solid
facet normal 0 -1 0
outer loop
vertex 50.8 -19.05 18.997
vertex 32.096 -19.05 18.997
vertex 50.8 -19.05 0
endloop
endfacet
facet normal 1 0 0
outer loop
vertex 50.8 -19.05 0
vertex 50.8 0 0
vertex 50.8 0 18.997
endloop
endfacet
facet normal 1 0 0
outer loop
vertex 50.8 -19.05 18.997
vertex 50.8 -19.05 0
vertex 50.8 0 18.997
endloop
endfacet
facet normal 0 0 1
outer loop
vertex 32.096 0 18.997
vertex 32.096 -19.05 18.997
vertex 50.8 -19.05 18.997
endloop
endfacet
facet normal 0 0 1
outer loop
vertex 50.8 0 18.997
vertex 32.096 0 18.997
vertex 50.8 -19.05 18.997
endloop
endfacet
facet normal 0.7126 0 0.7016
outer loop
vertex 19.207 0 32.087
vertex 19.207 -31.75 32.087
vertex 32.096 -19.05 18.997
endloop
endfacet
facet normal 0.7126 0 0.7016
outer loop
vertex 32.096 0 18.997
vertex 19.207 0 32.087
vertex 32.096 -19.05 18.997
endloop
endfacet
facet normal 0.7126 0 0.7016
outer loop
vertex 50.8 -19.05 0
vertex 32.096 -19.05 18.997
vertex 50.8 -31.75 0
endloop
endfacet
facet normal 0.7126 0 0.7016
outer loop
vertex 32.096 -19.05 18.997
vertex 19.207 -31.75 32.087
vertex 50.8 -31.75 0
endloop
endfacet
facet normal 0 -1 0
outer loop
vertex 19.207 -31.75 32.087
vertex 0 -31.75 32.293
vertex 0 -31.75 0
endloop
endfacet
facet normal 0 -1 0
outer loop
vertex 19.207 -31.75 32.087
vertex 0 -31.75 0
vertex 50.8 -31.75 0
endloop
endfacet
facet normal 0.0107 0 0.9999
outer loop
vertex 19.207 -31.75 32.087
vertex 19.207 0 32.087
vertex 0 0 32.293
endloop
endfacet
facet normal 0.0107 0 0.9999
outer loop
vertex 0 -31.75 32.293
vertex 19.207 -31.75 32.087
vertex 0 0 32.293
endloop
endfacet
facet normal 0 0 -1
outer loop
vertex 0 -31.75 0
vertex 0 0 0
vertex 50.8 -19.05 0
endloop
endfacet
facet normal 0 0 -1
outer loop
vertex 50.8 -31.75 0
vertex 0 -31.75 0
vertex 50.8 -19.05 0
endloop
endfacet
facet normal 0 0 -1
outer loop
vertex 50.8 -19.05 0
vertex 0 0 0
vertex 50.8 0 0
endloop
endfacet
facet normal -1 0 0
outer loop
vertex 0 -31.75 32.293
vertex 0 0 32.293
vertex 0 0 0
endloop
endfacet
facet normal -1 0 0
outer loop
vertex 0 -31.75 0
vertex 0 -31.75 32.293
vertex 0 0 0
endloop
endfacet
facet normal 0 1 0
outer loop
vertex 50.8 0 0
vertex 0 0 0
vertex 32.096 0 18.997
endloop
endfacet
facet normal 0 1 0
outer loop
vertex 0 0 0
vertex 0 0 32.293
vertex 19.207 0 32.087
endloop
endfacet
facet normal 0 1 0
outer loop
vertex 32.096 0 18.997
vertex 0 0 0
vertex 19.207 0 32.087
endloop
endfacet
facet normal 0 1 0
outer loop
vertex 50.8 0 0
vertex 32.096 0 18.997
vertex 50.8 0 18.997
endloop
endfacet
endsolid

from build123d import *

# Parameters (mm, degrees)
F1_DEPTH = 31.75
F3_DEPTH = 12.7
F5_DEPTH = 19.051


with BuildPart() as f1:
    # F0 (on Front) → F1 (new body)
    with BuildSketch(Plane.XZ):
        Polygon((50.8, 31.75), (0, 32.2926561947), (0, 0), (50.8, 0), align=None)
    extrude(amount=F1_DEPTH)

    # F2 (on face) → F3 (cut)
    with BuildSketch(Plane.XZ.offset(31.75)):
        Polygon((50.8, 31.75), (19.2072158541, 32.0874807091), (50.8, 0), align=None)
    extrude(amount=-F3_DEPTH, mode=Mode.SUBTRACT)

    # F4 (on face) → F5 (cut, through all)
    with BuildSketch(Plane.XZ.offset(19.05)):
        Polygon((32.0955355752, 18.997348845), (50.8, 18.997348845), (50.8, 31.75), (19.2072158541, 32.0874807091), align=None)
    extrude(amount=-F5_DEPTH, mode=Mode.SUBTRACT)


solid = f1.part
